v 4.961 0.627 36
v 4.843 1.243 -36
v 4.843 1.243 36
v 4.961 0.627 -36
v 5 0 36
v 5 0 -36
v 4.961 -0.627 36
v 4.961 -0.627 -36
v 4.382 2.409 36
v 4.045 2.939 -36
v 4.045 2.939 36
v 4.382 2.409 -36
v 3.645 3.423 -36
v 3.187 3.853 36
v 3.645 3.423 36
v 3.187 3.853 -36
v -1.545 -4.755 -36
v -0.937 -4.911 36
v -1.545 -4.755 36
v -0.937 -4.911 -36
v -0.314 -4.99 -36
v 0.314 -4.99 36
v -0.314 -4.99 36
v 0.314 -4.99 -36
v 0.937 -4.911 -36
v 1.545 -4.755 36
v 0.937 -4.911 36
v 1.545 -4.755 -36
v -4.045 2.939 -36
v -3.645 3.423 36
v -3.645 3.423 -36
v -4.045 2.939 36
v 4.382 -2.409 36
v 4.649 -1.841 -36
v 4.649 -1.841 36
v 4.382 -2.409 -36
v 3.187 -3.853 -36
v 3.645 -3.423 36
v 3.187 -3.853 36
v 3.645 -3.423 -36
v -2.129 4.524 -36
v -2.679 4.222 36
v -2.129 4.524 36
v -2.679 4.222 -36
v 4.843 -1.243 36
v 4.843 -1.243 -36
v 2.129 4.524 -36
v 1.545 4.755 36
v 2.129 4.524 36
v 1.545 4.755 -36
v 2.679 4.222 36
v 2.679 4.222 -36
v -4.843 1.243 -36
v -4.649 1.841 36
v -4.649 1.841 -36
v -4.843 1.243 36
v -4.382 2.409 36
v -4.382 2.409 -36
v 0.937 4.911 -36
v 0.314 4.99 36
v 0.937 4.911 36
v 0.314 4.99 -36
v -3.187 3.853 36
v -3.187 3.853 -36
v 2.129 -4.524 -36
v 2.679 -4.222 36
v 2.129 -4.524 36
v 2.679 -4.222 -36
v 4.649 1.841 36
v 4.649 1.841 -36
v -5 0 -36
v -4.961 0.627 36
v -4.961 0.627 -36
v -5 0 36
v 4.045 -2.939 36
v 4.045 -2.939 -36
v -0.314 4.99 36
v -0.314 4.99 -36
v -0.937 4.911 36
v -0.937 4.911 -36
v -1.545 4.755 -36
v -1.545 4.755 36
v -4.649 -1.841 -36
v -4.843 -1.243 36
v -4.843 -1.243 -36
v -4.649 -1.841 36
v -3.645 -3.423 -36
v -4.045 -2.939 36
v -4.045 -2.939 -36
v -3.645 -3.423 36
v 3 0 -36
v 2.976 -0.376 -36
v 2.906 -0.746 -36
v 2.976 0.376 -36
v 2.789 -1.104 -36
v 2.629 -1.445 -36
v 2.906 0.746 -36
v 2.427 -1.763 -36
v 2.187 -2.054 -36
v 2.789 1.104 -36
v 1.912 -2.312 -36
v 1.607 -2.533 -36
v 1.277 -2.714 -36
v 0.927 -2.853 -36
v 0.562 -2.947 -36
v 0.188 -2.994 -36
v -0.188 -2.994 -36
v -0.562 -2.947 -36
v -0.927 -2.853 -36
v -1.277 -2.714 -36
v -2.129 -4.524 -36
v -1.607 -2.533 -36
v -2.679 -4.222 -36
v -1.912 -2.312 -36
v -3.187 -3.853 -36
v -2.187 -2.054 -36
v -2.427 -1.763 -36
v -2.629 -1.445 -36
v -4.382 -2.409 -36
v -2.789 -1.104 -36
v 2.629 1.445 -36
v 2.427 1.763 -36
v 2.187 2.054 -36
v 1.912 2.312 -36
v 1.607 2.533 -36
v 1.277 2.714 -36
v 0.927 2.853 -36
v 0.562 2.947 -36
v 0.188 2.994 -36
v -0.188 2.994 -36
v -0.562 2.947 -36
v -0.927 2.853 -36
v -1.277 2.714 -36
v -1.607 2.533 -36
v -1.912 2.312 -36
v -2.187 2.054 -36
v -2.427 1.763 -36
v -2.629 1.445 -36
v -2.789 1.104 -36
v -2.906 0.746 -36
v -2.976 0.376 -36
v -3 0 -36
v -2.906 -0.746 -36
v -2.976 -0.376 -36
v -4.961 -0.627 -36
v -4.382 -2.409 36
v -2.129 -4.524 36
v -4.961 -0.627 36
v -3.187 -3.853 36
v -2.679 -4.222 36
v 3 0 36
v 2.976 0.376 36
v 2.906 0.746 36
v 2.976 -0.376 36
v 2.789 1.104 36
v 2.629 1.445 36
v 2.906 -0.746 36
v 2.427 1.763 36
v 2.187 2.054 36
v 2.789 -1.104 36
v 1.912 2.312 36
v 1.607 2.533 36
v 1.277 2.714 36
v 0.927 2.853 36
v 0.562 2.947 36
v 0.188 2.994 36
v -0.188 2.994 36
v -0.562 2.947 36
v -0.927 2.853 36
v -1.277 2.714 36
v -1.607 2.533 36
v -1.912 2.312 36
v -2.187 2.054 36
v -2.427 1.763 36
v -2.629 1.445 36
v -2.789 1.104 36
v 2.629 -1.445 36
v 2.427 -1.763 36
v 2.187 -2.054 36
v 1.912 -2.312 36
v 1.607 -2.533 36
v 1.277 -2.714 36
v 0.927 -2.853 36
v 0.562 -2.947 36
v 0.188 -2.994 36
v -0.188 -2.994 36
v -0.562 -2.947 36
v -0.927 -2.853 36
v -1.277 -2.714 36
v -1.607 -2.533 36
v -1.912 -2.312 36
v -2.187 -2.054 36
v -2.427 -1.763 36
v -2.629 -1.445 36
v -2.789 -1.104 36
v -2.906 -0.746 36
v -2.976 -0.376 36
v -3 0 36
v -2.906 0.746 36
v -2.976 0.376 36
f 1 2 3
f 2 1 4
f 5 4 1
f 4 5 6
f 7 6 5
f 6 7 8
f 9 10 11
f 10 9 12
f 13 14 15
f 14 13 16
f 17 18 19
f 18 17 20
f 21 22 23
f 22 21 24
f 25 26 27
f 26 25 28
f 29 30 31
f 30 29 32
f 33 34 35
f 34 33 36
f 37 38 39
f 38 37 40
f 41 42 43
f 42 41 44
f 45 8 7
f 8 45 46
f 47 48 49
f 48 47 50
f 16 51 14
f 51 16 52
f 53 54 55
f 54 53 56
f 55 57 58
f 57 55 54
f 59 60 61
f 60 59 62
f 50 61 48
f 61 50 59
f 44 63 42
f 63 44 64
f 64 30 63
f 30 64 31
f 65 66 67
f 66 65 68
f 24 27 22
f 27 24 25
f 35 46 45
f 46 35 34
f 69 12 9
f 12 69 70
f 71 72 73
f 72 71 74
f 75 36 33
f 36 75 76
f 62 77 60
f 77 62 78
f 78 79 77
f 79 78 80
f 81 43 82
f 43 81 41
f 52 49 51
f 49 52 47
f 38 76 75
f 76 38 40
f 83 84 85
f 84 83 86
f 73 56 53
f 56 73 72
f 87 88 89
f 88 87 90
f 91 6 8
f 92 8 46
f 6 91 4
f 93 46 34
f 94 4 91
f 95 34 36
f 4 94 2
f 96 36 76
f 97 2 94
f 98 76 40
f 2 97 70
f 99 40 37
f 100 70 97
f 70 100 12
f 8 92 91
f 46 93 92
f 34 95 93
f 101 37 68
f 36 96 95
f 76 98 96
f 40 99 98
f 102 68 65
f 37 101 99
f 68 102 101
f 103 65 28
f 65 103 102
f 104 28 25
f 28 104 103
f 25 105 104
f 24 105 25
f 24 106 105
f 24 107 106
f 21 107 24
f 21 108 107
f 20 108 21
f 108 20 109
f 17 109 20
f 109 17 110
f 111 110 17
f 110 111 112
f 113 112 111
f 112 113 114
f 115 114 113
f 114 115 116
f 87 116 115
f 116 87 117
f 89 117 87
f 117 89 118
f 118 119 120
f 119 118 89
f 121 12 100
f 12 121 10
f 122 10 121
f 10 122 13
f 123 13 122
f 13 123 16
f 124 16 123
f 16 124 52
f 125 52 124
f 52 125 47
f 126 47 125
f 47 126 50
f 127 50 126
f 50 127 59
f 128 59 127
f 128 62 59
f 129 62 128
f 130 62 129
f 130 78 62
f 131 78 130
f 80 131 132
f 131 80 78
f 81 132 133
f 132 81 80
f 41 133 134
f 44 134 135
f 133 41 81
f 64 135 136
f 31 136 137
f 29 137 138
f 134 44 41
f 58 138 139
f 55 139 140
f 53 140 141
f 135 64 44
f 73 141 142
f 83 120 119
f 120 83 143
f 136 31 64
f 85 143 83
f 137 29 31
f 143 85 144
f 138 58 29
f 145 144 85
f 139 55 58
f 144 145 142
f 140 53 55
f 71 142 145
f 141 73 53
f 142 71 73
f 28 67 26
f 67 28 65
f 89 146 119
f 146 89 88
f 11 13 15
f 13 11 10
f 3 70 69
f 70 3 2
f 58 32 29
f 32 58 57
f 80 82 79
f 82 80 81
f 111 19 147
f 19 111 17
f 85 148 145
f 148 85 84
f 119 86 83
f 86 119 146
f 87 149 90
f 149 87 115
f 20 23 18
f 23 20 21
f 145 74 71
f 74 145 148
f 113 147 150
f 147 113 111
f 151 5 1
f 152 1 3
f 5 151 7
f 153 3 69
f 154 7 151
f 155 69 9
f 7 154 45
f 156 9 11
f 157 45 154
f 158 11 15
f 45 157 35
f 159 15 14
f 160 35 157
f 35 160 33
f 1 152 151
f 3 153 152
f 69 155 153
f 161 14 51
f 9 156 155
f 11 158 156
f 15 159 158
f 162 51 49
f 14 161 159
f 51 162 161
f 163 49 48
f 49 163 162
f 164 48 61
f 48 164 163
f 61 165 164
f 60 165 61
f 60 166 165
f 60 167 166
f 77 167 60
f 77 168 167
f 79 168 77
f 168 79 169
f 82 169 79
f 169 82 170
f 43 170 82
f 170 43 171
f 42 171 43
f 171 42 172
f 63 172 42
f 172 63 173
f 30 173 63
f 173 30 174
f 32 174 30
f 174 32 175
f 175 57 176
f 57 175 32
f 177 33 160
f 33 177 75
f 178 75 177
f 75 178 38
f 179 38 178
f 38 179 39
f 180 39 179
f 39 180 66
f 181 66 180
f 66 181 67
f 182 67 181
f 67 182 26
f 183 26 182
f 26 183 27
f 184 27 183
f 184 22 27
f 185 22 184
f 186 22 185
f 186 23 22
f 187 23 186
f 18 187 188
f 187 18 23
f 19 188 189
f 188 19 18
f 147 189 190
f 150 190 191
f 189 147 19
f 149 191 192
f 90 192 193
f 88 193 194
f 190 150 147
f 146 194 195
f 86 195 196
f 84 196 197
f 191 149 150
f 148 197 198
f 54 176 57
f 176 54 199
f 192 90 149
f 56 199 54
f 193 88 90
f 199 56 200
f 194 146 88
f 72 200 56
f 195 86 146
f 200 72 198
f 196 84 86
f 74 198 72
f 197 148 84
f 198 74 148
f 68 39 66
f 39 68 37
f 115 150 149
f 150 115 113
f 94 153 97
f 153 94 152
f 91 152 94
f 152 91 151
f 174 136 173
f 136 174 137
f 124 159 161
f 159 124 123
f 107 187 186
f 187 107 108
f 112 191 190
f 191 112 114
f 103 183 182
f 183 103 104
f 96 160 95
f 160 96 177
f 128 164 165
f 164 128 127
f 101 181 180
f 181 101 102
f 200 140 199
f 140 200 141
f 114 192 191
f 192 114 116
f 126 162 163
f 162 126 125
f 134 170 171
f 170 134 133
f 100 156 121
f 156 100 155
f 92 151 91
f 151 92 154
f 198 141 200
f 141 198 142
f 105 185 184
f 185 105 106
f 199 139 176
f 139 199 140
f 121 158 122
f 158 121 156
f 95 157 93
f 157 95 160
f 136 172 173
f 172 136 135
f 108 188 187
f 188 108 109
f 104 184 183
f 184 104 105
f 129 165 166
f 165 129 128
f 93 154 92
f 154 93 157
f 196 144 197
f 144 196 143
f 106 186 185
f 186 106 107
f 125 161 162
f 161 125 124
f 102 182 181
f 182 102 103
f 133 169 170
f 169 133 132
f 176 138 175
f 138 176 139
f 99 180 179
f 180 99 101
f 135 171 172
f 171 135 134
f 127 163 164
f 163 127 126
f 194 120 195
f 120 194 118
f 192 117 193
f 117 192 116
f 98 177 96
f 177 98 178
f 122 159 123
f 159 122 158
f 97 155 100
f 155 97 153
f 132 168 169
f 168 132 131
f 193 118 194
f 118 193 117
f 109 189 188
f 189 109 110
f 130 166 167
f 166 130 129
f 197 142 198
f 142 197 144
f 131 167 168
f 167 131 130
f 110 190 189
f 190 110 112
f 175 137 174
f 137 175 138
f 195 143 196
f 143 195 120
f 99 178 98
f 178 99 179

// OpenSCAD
$fn = 50;


difference() {
	union() {
		translate(v = [0, 0, -36.0000000000]) {
			cylinder(h = 72, r = 5.0000000000);
		}
	}
	union() {
		translate(v = [0, 0, -100.0000000000]) {
			cylinder(h = 200, r = 3.0000000000);
		}
	}
}
